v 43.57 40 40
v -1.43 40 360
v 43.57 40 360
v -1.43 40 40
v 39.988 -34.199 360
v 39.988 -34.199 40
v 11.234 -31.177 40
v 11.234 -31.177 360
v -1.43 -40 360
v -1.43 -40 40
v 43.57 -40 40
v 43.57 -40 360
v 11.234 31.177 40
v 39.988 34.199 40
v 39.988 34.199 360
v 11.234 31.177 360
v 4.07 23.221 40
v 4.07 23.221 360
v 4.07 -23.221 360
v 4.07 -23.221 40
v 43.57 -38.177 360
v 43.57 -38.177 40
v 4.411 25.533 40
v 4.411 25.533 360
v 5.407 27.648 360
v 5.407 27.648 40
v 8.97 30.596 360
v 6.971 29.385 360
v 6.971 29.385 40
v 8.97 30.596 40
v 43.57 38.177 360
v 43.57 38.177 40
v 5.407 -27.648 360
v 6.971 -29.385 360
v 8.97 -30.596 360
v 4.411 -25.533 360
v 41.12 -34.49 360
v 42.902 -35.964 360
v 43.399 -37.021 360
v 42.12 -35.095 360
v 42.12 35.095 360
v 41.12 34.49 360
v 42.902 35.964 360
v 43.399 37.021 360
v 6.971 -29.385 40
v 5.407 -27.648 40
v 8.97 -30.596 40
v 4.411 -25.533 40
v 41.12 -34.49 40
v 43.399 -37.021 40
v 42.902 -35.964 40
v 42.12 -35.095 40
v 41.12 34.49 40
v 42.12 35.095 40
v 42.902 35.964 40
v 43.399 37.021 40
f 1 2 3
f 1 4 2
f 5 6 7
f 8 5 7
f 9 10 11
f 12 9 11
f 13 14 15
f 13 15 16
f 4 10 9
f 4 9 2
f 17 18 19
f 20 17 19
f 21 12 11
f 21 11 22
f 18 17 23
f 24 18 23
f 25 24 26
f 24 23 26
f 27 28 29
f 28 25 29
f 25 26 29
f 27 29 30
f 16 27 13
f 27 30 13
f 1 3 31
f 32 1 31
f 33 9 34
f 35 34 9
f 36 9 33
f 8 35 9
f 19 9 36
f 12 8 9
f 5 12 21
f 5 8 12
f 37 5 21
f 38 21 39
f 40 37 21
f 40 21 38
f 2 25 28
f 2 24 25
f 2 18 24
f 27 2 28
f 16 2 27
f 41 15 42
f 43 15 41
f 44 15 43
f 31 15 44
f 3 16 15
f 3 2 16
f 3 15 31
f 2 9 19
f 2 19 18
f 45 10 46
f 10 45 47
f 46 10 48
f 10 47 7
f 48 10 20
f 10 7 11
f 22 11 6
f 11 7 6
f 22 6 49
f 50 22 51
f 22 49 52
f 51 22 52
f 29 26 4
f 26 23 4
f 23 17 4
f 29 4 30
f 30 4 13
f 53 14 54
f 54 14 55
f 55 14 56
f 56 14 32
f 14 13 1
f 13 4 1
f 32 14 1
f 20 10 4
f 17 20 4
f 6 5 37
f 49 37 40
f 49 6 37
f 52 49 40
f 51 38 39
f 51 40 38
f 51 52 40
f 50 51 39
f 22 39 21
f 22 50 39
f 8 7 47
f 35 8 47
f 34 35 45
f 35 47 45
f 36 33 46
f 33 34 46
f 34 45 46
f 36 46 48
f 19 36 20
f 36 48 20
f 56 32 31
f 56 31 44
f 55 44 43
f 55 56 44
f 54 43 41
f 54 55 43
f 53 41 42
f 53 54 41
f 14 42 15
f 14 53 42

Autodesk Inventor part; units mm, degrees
ref_plane "Начальная плоскость" through (0, 0, 40) normal (0, 0, 1) x (1, 0, 0)
ref_plane "Конечная плоскость" through (0, 0, 360) normal (0, 0, 1) x (1, 0, 0)
sketch "Эскиз" plane through (0, 0, 0) normal (0, 0, 1) x (1, 0, 0)
  line L0 (-1.43, 0) -> (-1.43, 40)
  line L1 (-1.43, 40) -> (43.57, 40)
  line L2 (43.57, 40) -> (43.57, 38.1774)
  line L3 (39.9881, 34.1993) -> (11.2338, 31.1771)
  line L4 (4.07, 23.221) -> (4.07, 0)
  line L5 (4.07, 0) -> (-1.43, 0) construction
  line L6 (23.82, 40) -> (23.82, 32.5) construction
  line L7 (43.57, 34.5758) -> (43.57, 32.5) construction
  line L8 (43.57, 32.5) -> (23.82, 32.5) construction
  line L9 (0, 15) -> (0, -27) construction
  line L10 (-5.539, 0) -> (16.0067, 0) construction
  line L11 (-1.43, 0) -> (-1.43, -40)
  line L12 (-1.43, -40) -> (43.57, -40)
  line L13 (43.57, -40) -> (43.57, -38.1774)
  line L14 (39.9881, -34.1993) -> (11.2338, -31.1771)
  line L15 (4.07, -23.221) -> (4.07, 0)
  arc A0 (11.2338, 31.1771) -> (4.07, 23.221) centre (12.07, 23.221) ccw
  arc A1 (4.07, -23.221) -> (11.2338, -31.1771) centre (12.07, -23.221) ccw
  arc A2 (39.9881, 34.1993) -> (43.57, 38.1774) centre (39.57, 38.1774) ccw
  arc A3 (43.57, -38.1774) -> (39.9881, -34.1993) centre (39.57, -38.1774) ccw
  line L16 (0, 56) -> (0, -56) construction
  line L17 (-15.5135, 0) -> (54.308, 0) construction
  point P0 (4.07, 30.4242)
  point P1 (43.57, -34.5758)
  point P2 (4.07, -30.4242)
  point P3 (23.82, -40)
  point P4 (23.82, -32.5)
  dimension "d0" = 5.5
  dimension "d1" = 40
  dimension "d2" = 45
  dimension "d3" = 7.5
  dimension "d4" = 19.75
  dimension "d5" = 2.0758
  dimension "d23" = 8
  dimension "d24" = 4
  dimension "d25" = 1.43
extrude "Тело" add sketch "Эскиз" along normal up to surface (320 mm away) from surface at 40
sketch "Sketch3" plane through (0, 0, 0) normal (0, 0, 1) x (1, 0, 0)
  line L0 (0, 0) -> (10, 0)
ref_plane "Work Plane3" through (0, 0, 0) normal (0, -1, 0) x (1, 0, 0)
sketch "Sketch4" plane through (0, 0, 0) normal (0, -1, 0) x (1, 0, 0)
  line L0 (-2, 40) -> (12, 40)
  line L1 (-2, 360) -> (12, 360)
  dimension "d29" = 320
ref_plane "РабПлоскость4" through (43.57, -400, 40) normal (0, 0, -1) x (-1, 0, 0)
split "Разделение1" plane through (43.57, -400, 40) removes the side toward (0, 0, -1)
ref_plane "РабПлоскость5" through (43.57, 270, 360) normal (0, 0, 1) x (1, 0, 0)
split "Разделение2" plane through (43.57, 270, 360) removes the side toward (0, 0, 1)
equation "\"d0\" = G_T"
equation "\"d1\" = 0.5 * G_H"
equation "\"d2\" = G_W"
equation "\"d3\" = G_T1"
equation "\"d4\" = G_C"
equation "\"d23\" = G_IR"
equation "\"d24\" = G_ER"
equation "\"d25\" = ex"
equation "\"d6\" = G_L"
equation "\"G_W\" = 45"
equation "\"G_T\" = 5.5"
equation "\"G_T1\" = 7.5"
equation "\"G_NG\" = 0.105104"
equation "\"G_ER\" = 4"
equation "\"G_IR\" = 8"
equation "\"G_C\" = 19.75"
equation "\"G_L\" = d29"
equation "\"ex\" = 1.43"
equation "\"G_H\" = 80"
properties part number "ISO 657/11 - CH 80 x 8 - 320" material "Сталь, мягкая"
